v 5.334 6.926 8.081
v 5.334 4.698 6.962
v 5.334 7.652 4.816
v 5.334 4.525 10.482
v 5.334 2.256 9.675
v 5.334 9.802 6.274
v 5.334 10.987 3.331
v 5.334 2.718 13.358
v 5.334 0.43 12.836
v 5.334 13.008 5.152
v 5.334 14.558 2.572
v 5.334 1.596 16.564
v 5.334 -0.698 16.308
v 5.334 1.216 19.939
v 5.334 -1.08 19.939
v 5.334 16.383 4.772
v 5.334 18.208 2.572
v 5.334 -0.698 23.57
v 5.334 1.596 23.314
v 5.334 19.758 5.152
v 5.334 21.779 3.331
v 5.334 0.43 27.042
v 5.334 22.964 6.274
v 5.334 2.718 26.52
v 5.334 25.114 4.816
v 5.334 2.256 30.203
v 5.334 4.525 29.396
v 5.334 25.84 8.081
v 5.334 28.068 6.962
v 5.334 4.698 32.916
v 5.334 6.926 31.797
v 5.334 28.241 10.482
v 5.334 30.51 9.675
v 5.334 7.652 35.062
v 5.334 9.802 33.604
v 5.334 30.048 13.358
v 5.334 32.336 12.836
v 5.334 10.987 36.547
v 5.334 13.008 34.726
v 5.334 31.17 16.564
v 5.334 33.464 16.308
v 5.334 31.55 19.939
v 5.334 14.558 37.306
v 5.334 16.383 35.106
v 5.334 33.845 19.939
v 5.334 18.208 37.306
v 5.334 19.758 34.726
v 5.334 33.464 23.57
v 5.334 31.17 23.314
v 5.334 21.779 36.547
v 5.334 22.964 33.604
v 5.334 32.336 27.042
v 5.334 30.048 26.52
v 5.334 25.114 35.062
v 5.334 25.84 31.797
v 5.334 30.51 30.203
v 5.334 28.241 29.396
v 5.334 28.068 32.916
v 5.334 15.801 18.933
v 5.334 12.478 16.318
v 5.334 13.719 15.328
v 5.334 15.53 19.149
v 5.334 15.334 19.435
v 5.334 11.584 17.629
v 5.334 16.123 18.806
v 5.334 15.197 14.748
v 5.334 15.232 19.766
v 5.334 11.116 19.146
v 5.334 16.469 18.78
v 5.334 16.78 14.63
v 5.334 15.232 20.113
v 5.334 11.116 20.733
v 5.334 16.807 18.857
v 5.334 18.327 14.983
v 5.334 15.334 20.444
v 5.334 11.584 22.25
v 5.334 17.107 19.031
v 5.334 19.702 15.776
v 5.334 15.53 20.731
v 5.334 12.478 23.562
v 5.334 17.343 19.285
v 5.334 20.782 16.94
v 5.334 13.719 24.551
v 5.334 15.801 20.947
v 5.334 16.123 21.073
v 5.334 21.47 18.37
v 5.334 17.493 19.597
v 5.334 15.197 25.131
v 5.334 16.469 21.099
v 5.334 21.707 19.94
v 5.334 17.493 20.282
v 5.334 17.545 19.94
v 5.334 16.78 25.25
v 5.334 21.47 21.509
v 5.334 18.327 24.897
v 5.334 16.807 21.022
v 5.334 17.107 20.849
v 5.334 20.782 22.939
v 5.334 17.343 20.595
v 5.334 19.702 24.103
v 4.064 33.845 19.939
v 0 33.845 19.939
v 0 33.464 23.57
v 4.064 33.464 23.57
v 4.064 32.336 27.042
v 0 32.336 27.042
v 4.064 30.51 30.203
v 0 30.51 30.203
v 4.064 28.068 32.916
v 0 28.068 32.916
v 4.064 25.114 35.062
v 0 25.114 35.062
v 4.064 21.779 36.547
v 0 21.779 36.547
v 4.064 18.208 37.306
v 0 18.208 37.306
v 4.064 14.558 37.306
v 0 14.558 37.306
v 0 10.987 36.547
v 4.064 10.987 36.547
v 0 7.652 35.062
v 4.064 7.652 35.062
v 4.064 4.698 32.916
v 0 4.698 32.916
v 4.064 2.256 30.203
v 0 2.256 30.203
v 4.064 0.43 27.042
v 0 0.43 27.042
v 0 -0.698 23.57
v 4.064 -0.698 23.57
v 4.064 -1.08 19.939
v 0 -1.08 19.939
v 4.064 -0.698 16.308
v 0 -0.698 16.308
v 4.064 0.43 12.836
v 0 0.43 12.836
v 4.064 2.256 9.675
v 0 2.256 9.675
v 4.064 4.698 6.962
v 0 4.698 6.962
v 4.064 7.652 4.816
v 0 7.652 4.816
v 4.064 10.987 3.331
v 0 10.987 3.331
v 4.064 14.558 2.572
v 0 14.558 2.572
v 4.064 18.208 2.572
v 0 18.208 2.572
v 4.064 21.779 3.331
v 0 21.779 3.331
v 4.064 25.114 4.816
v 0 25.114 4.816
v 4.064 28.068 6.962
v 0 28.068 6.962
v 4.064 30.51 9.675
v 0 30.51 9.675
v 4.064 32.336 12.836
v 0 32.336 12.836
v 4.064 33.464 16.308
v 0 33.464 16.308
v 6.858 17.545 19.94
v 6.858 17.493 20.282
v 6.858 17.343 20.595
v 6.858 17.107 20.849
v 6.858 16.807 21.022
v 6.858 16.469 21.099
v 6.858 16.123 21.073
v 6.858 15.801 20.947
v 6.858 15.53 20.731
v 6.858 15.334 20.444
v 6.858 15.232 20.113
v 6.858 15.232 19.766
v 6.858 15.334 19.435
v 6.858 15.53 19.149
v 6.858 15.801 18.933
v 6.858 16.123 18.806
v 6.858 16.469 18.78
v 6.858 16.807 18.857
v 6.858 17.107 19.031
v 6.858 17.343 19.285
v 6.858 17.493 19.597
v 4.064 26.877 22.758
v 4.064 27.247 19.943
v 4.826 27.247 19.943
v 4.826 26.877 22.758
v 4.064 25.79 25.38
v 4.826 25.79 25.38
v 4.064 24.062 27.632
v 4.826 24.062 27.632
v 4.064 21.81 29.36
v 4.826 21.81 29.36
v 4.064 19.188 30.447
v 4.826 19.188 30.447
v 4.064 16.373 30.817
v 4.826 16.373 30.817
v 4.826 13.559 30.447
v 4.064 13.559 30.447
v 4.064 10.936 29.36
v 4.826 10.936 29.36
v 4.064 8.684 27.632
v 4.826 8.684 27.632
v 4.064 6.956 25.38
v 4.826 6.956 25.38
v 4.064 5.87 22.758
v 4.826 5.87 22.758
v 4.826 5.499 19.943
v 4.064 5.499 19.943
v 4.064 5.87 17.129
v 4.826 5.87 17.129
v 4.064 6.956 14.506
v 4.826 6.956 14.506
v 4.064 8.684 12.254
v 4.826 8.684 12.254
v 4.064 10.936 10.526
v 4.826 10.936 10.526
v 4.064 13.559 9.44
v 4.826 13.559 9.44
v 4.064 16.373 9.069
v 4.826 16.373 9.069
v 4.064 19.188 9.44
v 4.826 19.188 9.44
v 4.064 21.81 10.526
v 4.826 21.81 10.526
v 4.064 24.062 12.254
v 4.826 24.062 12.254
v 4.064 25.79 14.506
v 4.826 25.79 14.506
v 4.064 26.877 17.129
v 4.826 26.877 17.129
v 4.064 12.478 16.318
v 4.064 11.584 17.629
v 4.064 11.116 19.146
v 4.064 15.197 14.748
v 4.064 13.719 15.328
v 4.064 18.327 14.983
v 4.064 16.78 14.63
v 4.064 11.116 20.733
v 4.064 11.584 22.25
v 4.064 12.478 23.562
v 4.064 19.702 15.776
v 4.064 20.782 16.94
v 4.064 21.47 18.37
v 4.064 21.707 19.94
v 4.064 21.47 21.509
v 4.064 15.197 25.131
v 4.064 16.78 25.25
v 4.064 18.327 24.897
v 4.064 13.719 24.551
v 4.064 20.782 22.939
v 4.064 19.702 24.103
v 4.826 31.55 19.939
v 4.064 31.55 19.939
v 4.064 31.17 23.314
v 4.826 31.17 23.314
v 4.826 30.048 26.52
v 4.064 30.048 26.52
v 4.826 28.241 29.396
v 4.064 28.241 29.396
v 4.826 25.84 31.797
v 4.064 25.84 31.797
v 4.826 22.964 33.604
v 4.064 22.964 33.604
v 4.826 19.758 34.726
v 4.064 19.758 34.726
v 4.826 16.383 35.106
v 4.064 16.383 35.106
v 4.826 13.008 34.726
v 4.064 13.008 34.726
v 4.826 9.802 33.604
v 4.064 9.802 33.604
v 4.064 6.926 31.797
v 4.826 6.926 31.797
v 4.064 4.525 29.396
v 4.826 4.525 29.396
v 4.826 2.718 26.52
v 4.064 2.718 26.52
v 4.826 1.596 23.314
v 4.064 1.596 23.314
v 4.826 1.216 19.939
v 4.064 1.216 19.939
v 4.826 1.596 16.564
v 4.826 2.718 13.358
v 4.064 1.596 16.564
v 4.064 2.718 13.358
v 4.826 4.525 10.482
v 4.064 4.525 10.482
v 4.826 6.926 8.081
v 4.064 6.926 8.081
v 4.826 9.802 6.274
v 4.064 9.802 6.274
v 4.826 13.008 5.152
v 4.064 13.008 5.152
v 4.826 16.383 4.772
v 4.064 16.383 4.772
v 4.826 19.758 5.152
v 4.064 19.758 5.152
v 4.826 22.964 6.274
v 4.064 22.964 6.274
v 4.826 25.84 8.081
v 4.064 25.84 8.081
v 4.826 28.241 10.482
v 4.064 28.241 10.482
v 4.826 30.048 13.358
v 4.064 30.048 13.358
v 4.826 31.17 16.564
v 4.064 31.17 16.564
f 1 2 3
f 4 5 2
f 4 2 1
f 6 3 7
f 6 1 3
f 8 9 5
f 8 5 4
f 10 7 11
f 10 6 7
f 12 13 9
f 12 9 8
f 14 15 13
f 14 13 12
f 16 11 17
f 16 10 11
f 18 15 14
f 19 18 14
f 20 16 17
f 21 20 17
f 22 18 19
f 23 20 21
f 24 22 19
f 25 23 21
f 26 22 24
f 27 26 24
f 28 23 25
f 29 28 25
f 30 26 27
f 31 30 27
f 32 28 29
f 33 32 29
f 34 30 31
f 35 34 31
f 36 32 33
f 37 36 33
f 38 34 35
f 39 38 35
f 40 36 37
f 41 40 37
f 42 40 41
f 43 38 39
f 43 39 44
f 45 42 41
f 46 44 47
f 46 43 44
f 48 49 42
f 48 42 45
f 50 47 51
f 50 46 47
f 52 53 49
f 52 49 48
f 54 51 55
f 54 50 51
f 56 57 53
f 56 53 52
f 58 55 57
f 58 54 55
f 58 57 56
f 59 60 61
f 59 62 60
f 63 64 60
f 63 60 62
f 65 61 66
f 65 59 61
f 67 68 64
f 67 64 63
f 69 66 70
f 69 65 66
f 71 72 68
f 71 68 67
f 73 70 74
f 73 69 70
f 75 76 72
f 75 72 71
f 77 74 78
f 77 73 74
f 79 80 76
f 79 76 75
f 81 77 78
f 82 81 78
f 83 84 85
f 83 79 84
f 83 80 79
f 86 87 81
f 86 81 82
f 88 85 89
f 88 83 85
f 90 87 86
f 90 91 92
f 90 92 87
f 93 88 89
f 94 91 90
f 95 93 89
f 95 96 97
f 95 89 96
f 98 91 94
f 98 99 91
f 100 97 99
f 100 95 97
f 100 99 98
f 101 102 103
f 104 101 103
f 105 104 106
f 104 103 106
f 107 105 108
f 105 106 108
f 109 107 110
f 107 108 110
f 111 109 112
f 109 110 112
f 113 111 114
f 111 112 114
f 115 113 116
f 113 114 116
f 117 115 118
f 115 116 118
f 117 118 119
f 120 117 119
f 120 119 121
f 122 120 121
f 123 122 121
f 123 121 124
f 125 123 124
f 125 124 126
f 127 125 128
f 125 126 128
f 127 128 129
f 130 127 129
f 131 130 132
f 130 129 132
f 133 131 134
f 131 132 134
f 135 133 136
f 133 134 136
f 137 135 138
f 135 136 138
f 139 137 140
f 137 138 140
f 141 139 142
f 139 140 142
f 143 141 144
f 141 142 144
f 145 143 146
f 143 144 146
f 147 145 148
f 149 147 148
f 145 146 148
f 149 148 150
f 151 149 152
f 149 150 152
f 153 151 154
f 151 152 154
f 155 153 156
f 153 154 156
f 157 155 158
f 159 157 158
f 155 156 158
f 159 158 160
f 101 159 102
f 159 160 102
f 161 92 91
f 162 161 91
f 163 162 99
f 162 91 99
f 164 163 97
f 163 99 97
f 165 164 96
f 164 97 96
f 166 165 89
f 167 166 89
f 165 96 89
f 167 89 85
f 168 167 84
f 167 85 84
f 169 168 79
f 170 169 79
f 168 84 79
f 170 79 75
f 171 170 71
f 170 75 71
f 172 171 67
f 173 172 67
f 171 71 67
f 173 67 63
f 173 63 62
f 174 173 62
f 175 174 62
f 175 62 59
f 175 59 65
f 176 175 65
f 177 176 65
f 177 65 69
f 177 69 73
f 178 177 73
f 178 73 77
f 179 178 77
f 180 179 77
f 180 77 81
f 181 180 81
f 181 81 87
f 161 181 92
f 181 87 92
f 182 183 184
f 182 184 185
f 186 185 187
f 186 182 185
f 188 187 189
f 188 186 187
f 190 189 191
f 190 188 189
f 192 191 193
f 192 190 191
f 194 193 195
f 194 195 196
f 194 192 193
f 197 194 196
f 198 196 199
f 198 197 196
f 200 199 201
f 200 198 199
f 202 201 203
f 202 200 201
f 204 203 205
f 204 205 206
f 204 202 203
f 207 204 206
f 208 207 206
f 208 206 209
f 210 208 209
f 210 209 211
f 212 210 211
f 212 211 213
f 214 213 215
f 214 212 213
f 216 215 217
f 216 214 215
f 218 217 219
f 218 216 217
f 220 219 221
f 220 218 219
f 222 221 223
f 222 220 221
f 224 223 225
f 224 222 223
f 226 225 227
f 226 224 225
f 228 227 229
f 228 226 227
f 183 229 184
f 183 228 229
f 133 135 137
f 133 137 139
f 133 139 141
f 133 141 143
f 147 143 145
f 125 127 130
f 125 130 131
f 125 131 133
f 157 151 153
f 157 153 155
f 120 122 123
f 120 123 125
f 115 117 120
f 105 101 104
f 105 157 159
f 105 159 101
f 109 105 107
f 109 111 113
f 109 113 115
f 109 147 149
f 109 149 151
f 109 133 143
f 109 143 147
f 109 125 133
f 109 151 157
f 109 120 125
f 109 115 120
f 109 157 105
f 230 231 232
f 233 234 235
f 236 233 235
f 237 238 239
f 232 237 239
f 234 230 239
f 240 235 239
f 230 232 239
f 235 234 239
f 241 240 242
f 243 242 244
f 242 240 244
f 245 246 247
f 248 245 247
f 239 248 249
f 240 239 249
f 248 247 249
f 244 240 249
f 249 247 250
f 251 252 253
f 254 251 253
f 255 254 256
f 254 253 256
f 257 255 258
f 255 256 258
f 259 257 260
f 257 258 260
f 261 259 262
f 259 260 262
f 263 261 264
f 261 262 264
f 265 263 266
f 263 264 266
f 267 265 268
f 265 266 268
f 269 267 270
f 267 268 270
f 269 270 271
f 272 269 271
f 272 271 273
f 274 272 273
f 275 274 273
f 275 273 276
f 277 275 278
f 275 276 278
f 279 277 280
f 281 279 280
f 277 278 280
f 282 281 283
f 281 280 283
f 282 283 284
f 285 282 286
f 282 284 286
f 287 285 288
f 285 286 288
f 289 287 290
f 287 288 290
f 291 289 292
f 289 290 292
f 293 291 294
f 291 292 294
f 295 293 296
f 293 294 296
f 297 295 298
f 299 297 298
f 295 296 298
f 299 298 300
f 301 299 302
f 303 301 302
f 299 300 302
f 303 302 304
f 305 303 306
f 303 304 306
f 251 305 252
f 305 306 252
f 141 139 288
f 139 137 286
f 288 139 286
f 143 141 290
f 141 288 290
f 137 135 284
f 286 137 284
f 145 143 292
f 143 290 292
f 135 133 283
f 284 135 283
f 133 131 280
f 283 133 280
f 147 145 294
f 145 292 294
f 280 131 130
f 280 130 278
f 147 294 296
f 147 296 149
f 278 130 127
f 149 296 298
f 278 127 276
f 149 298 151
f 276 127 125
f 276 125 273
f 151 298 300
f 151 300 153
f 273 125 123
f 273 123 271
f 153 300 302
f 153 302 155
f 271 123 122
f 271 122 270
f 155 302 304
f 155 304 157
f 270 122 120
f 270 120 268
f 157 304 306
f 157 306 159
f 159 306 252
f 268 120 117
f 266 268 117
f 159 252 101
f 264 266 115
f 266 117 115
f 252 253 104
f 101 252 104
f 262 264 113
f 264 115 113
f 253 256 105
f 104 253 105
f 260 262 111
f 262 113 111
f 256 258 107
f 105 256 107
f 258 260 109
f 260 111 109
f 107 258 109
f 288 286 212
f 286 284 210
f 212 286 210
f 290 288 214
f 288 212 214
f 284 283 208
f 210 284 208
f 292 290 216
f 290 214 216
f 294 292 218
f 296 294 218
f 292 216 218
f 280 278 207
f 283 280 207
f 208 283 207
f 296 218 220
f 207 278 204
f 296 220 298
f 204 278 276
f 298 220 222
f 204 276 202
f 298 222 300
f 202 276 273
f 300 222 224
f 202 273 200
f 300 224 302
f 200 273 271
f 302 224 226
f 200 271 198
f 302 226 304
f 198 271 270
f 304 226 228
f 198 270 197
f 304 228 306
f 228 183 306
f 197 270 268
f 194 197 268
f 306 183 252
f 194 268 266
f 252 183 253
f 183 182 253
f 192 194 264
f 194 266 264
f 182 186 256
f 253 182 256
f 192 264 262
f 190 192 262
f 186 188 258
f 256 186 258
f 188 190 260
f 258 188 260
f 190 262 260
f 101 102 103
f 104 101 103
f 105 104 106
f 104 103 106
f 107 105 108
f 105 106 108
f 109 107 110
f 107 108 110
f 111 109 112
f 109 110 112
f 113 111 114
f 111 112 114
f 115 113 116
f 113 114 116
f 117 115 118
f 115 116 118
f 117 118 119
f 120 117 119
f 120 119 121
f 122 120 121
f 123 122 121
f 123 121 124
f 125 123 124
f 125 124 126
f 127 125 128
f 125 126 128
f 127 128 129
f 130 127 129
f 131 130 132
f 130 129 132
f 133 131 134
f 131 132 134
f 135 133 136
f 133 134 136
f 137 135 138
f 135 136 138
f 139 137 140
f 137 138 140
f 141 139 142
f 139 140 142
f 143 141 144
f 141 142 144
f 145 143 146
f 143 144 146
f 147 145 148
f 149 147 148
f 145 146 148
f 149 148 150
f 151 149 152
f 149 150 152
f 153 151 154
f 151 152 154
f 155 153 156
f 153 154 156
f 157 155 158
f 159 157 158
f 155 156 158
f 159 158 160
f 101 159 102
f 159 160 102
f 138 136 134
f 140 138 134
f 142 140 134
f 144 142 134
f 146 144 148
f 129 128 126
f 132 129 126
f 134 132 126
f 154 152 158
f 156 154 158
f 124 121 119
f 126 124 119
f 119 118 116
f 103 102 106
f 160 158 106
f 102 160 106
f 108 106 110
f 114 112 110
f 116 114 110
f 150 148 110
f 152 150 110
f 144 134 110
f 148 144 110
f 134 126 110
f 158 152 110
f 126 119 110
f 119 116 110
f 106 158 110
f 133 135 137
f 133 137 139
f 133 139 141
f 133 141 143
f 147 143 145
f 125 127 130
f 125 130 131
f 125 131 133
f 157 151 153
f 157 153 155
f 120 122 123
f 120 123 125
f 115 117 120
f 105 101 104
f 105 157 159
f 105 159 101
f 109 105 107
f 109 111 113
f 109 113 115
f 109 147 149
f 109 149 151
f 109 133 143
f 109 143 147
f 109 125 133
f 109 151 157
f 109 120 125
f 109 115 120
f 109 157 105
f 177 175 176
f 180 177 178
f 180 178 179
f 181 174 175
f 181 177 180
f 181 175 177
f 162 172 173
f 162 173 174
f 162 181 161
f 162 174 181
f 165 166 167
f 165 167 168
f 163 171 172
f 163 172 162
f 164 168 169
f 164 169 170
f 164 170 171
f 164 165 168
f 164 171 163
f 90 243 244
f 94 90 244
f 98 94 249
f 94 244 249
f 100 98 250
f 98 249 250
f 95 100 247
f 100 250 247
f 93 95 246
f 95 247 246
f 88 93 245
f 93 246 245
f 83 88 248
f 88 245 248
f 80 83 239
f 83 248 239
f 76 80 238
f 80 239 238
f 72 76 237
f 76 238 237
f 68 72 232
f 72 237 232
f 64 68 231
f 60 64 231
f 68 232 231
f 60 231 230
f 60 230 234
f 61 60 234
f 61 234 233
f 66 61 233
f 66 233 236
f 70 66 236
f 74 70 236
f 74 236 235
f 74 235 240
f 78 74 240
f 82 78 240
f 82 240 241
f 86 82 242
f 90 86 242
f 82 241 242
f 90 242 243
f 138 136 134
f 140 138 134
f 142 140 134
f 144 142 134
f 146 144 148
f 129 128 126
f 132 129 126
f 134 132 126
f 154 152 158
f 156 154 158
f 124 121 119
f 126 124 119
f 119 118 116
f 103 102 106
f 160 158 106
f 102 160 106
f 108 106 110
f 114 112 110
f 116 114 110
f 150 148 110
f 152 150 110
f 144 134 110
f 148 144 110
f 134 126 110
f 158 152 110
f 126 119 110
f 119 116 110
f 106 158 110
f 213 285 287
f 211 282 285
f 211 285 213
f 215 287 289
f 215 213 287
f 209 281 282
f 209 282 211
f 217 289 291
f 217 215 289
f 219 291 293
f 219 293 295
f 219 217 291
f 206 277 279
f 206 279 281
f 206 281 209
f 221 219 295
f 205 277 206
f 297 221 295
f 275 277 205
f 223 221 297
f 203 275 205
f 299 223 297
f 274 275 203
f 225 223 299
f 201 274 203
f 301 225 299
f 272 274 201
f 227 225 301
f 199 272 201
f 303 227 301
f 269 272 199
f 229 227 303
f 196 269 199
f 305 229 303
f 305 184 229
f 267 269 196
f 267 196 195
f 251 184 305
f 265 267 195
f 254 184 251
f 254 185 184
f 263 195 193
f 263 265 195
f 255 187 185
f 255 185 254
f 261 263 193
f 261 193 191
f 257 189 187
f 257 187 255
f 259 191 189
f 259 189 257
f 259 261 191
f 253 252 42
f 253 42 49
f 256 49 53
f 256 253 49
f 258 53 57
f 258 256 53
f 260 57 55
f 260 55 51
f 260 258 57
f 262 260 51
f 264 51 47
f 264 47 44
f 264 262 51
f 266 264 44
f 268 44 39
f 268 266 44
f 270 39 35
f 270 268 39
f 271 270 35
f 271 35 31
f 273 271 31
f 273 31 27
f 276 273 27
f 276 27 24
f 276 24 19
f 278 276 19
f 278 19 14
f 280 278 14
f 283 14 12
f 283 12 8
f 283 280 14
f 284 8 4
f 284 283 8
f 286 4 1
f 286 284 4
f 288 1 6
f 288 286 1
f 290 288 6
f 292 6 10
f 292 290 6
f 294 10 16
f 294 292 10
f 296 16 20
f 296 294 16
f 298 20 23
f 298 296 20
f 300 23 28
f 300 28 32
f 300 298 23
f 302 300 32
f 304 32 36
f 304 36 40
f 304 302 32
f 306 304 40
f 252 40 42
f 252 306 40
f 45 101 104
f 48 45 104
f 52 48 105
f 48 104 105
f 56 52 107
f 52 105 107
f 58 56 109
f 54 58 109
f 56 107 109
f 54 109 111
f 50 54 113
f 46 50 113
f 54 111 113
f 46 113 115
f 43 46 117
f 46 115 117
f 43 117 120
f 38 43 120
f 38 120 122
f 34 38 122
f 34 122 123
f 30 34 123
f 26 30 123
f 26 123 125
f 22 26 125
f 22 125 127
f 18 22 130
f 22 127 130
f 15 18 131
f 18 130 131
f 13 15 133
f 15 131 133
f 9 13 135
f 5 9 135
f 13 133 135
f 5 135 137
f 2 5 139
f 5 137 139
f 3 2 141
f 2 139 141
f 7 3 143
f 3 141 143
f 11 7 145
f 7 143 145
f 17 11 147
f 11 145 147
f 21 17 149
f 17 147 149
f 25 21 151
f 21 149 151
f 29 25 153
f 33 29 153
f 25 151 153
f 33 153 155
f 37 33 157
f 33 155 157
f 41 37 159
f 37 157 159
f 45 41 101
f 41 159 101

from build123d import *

# Parameters (mm, degrees)
F0_R      = 17.4625
F2_DEPTH  = 4.064
F1_R      = 17.4625
F4_R      = 15.1671185888
F4_R_2    = 10.8740036782
F6_DEPTH  = 0.762
F7_R      = 5.3249265158
F8_DEPTH  = 1.27
F5_R      = 17.4625
F5_R_2    = 15.1671185888
F9_R      = 1.1627372516
F10_DEPTH = 1.524


with BuildPart() as f2:
    # F0 (on Right) → F2 (new body)
    with BuildSketch(Plane.YZ):
        with Locations((16.3829997182, 19.938999787)):
            Circle(F0_R)
    extrude(amount=F2_DEPTH)


with BuildPart() as f2b:
    # F1 (on face) → F2, piece 2 (new body)
    with BuildSketch(Plane.YZ):
        with Locations((16.3829997182, 19.938999787)):
            Circle(F1_R)
    extrude(amount=F2_DEPTH)


with BuildPart() as f6:
    # F4 (on face) → F6 (new body)
    with BuildSketch(Plane.YZ.offset(4.064)):
        with Locations((16.3829997182, 19.938999787)):
            Circle(F4_R)
        with Locations((16.3731891662, 19.9432447553)):
            Circle(F4_R_2, mode=Mode.SUBTRACT)
    extrude(amount=F6_DEPTH)


with BuildPart() as f8:
    # F7 (on face) → F8 (new body)
    with BuildSketch(Plane.YZ.offset(4.064)):
        with Locations((16.3819398731, 19.9396852404)):
            Circle(F7_R)
    extrude(amount=F8_DEPTH)

    # F9 (on face) → F10 (join)
    with BuildSketch(Plane.YZ.offset(5.334)):
        with Locations((16.3819398731, 19.9396852404)):
            Circle(F9_R)
    extrude(amount=F10_DEPTH)


with BuildPart() as f8b:
    # F5 (on face) → F8, piece 2 (new body)
    with BuildSketch(Plane.YZ.offset(4.064)):
        with Locations((16.3829997182, 19.938999787)):
            Circle(F5_R)
        with Locations((16.3829997182, 19.938999787)):
            Circle(F5_R_2, mode=Mode.SUBTRACT)
    extrude(amount=F8_DEPTH)


solid = Compound([f2.part, f2b.part, f6.part, f8.part, f8b.part])
